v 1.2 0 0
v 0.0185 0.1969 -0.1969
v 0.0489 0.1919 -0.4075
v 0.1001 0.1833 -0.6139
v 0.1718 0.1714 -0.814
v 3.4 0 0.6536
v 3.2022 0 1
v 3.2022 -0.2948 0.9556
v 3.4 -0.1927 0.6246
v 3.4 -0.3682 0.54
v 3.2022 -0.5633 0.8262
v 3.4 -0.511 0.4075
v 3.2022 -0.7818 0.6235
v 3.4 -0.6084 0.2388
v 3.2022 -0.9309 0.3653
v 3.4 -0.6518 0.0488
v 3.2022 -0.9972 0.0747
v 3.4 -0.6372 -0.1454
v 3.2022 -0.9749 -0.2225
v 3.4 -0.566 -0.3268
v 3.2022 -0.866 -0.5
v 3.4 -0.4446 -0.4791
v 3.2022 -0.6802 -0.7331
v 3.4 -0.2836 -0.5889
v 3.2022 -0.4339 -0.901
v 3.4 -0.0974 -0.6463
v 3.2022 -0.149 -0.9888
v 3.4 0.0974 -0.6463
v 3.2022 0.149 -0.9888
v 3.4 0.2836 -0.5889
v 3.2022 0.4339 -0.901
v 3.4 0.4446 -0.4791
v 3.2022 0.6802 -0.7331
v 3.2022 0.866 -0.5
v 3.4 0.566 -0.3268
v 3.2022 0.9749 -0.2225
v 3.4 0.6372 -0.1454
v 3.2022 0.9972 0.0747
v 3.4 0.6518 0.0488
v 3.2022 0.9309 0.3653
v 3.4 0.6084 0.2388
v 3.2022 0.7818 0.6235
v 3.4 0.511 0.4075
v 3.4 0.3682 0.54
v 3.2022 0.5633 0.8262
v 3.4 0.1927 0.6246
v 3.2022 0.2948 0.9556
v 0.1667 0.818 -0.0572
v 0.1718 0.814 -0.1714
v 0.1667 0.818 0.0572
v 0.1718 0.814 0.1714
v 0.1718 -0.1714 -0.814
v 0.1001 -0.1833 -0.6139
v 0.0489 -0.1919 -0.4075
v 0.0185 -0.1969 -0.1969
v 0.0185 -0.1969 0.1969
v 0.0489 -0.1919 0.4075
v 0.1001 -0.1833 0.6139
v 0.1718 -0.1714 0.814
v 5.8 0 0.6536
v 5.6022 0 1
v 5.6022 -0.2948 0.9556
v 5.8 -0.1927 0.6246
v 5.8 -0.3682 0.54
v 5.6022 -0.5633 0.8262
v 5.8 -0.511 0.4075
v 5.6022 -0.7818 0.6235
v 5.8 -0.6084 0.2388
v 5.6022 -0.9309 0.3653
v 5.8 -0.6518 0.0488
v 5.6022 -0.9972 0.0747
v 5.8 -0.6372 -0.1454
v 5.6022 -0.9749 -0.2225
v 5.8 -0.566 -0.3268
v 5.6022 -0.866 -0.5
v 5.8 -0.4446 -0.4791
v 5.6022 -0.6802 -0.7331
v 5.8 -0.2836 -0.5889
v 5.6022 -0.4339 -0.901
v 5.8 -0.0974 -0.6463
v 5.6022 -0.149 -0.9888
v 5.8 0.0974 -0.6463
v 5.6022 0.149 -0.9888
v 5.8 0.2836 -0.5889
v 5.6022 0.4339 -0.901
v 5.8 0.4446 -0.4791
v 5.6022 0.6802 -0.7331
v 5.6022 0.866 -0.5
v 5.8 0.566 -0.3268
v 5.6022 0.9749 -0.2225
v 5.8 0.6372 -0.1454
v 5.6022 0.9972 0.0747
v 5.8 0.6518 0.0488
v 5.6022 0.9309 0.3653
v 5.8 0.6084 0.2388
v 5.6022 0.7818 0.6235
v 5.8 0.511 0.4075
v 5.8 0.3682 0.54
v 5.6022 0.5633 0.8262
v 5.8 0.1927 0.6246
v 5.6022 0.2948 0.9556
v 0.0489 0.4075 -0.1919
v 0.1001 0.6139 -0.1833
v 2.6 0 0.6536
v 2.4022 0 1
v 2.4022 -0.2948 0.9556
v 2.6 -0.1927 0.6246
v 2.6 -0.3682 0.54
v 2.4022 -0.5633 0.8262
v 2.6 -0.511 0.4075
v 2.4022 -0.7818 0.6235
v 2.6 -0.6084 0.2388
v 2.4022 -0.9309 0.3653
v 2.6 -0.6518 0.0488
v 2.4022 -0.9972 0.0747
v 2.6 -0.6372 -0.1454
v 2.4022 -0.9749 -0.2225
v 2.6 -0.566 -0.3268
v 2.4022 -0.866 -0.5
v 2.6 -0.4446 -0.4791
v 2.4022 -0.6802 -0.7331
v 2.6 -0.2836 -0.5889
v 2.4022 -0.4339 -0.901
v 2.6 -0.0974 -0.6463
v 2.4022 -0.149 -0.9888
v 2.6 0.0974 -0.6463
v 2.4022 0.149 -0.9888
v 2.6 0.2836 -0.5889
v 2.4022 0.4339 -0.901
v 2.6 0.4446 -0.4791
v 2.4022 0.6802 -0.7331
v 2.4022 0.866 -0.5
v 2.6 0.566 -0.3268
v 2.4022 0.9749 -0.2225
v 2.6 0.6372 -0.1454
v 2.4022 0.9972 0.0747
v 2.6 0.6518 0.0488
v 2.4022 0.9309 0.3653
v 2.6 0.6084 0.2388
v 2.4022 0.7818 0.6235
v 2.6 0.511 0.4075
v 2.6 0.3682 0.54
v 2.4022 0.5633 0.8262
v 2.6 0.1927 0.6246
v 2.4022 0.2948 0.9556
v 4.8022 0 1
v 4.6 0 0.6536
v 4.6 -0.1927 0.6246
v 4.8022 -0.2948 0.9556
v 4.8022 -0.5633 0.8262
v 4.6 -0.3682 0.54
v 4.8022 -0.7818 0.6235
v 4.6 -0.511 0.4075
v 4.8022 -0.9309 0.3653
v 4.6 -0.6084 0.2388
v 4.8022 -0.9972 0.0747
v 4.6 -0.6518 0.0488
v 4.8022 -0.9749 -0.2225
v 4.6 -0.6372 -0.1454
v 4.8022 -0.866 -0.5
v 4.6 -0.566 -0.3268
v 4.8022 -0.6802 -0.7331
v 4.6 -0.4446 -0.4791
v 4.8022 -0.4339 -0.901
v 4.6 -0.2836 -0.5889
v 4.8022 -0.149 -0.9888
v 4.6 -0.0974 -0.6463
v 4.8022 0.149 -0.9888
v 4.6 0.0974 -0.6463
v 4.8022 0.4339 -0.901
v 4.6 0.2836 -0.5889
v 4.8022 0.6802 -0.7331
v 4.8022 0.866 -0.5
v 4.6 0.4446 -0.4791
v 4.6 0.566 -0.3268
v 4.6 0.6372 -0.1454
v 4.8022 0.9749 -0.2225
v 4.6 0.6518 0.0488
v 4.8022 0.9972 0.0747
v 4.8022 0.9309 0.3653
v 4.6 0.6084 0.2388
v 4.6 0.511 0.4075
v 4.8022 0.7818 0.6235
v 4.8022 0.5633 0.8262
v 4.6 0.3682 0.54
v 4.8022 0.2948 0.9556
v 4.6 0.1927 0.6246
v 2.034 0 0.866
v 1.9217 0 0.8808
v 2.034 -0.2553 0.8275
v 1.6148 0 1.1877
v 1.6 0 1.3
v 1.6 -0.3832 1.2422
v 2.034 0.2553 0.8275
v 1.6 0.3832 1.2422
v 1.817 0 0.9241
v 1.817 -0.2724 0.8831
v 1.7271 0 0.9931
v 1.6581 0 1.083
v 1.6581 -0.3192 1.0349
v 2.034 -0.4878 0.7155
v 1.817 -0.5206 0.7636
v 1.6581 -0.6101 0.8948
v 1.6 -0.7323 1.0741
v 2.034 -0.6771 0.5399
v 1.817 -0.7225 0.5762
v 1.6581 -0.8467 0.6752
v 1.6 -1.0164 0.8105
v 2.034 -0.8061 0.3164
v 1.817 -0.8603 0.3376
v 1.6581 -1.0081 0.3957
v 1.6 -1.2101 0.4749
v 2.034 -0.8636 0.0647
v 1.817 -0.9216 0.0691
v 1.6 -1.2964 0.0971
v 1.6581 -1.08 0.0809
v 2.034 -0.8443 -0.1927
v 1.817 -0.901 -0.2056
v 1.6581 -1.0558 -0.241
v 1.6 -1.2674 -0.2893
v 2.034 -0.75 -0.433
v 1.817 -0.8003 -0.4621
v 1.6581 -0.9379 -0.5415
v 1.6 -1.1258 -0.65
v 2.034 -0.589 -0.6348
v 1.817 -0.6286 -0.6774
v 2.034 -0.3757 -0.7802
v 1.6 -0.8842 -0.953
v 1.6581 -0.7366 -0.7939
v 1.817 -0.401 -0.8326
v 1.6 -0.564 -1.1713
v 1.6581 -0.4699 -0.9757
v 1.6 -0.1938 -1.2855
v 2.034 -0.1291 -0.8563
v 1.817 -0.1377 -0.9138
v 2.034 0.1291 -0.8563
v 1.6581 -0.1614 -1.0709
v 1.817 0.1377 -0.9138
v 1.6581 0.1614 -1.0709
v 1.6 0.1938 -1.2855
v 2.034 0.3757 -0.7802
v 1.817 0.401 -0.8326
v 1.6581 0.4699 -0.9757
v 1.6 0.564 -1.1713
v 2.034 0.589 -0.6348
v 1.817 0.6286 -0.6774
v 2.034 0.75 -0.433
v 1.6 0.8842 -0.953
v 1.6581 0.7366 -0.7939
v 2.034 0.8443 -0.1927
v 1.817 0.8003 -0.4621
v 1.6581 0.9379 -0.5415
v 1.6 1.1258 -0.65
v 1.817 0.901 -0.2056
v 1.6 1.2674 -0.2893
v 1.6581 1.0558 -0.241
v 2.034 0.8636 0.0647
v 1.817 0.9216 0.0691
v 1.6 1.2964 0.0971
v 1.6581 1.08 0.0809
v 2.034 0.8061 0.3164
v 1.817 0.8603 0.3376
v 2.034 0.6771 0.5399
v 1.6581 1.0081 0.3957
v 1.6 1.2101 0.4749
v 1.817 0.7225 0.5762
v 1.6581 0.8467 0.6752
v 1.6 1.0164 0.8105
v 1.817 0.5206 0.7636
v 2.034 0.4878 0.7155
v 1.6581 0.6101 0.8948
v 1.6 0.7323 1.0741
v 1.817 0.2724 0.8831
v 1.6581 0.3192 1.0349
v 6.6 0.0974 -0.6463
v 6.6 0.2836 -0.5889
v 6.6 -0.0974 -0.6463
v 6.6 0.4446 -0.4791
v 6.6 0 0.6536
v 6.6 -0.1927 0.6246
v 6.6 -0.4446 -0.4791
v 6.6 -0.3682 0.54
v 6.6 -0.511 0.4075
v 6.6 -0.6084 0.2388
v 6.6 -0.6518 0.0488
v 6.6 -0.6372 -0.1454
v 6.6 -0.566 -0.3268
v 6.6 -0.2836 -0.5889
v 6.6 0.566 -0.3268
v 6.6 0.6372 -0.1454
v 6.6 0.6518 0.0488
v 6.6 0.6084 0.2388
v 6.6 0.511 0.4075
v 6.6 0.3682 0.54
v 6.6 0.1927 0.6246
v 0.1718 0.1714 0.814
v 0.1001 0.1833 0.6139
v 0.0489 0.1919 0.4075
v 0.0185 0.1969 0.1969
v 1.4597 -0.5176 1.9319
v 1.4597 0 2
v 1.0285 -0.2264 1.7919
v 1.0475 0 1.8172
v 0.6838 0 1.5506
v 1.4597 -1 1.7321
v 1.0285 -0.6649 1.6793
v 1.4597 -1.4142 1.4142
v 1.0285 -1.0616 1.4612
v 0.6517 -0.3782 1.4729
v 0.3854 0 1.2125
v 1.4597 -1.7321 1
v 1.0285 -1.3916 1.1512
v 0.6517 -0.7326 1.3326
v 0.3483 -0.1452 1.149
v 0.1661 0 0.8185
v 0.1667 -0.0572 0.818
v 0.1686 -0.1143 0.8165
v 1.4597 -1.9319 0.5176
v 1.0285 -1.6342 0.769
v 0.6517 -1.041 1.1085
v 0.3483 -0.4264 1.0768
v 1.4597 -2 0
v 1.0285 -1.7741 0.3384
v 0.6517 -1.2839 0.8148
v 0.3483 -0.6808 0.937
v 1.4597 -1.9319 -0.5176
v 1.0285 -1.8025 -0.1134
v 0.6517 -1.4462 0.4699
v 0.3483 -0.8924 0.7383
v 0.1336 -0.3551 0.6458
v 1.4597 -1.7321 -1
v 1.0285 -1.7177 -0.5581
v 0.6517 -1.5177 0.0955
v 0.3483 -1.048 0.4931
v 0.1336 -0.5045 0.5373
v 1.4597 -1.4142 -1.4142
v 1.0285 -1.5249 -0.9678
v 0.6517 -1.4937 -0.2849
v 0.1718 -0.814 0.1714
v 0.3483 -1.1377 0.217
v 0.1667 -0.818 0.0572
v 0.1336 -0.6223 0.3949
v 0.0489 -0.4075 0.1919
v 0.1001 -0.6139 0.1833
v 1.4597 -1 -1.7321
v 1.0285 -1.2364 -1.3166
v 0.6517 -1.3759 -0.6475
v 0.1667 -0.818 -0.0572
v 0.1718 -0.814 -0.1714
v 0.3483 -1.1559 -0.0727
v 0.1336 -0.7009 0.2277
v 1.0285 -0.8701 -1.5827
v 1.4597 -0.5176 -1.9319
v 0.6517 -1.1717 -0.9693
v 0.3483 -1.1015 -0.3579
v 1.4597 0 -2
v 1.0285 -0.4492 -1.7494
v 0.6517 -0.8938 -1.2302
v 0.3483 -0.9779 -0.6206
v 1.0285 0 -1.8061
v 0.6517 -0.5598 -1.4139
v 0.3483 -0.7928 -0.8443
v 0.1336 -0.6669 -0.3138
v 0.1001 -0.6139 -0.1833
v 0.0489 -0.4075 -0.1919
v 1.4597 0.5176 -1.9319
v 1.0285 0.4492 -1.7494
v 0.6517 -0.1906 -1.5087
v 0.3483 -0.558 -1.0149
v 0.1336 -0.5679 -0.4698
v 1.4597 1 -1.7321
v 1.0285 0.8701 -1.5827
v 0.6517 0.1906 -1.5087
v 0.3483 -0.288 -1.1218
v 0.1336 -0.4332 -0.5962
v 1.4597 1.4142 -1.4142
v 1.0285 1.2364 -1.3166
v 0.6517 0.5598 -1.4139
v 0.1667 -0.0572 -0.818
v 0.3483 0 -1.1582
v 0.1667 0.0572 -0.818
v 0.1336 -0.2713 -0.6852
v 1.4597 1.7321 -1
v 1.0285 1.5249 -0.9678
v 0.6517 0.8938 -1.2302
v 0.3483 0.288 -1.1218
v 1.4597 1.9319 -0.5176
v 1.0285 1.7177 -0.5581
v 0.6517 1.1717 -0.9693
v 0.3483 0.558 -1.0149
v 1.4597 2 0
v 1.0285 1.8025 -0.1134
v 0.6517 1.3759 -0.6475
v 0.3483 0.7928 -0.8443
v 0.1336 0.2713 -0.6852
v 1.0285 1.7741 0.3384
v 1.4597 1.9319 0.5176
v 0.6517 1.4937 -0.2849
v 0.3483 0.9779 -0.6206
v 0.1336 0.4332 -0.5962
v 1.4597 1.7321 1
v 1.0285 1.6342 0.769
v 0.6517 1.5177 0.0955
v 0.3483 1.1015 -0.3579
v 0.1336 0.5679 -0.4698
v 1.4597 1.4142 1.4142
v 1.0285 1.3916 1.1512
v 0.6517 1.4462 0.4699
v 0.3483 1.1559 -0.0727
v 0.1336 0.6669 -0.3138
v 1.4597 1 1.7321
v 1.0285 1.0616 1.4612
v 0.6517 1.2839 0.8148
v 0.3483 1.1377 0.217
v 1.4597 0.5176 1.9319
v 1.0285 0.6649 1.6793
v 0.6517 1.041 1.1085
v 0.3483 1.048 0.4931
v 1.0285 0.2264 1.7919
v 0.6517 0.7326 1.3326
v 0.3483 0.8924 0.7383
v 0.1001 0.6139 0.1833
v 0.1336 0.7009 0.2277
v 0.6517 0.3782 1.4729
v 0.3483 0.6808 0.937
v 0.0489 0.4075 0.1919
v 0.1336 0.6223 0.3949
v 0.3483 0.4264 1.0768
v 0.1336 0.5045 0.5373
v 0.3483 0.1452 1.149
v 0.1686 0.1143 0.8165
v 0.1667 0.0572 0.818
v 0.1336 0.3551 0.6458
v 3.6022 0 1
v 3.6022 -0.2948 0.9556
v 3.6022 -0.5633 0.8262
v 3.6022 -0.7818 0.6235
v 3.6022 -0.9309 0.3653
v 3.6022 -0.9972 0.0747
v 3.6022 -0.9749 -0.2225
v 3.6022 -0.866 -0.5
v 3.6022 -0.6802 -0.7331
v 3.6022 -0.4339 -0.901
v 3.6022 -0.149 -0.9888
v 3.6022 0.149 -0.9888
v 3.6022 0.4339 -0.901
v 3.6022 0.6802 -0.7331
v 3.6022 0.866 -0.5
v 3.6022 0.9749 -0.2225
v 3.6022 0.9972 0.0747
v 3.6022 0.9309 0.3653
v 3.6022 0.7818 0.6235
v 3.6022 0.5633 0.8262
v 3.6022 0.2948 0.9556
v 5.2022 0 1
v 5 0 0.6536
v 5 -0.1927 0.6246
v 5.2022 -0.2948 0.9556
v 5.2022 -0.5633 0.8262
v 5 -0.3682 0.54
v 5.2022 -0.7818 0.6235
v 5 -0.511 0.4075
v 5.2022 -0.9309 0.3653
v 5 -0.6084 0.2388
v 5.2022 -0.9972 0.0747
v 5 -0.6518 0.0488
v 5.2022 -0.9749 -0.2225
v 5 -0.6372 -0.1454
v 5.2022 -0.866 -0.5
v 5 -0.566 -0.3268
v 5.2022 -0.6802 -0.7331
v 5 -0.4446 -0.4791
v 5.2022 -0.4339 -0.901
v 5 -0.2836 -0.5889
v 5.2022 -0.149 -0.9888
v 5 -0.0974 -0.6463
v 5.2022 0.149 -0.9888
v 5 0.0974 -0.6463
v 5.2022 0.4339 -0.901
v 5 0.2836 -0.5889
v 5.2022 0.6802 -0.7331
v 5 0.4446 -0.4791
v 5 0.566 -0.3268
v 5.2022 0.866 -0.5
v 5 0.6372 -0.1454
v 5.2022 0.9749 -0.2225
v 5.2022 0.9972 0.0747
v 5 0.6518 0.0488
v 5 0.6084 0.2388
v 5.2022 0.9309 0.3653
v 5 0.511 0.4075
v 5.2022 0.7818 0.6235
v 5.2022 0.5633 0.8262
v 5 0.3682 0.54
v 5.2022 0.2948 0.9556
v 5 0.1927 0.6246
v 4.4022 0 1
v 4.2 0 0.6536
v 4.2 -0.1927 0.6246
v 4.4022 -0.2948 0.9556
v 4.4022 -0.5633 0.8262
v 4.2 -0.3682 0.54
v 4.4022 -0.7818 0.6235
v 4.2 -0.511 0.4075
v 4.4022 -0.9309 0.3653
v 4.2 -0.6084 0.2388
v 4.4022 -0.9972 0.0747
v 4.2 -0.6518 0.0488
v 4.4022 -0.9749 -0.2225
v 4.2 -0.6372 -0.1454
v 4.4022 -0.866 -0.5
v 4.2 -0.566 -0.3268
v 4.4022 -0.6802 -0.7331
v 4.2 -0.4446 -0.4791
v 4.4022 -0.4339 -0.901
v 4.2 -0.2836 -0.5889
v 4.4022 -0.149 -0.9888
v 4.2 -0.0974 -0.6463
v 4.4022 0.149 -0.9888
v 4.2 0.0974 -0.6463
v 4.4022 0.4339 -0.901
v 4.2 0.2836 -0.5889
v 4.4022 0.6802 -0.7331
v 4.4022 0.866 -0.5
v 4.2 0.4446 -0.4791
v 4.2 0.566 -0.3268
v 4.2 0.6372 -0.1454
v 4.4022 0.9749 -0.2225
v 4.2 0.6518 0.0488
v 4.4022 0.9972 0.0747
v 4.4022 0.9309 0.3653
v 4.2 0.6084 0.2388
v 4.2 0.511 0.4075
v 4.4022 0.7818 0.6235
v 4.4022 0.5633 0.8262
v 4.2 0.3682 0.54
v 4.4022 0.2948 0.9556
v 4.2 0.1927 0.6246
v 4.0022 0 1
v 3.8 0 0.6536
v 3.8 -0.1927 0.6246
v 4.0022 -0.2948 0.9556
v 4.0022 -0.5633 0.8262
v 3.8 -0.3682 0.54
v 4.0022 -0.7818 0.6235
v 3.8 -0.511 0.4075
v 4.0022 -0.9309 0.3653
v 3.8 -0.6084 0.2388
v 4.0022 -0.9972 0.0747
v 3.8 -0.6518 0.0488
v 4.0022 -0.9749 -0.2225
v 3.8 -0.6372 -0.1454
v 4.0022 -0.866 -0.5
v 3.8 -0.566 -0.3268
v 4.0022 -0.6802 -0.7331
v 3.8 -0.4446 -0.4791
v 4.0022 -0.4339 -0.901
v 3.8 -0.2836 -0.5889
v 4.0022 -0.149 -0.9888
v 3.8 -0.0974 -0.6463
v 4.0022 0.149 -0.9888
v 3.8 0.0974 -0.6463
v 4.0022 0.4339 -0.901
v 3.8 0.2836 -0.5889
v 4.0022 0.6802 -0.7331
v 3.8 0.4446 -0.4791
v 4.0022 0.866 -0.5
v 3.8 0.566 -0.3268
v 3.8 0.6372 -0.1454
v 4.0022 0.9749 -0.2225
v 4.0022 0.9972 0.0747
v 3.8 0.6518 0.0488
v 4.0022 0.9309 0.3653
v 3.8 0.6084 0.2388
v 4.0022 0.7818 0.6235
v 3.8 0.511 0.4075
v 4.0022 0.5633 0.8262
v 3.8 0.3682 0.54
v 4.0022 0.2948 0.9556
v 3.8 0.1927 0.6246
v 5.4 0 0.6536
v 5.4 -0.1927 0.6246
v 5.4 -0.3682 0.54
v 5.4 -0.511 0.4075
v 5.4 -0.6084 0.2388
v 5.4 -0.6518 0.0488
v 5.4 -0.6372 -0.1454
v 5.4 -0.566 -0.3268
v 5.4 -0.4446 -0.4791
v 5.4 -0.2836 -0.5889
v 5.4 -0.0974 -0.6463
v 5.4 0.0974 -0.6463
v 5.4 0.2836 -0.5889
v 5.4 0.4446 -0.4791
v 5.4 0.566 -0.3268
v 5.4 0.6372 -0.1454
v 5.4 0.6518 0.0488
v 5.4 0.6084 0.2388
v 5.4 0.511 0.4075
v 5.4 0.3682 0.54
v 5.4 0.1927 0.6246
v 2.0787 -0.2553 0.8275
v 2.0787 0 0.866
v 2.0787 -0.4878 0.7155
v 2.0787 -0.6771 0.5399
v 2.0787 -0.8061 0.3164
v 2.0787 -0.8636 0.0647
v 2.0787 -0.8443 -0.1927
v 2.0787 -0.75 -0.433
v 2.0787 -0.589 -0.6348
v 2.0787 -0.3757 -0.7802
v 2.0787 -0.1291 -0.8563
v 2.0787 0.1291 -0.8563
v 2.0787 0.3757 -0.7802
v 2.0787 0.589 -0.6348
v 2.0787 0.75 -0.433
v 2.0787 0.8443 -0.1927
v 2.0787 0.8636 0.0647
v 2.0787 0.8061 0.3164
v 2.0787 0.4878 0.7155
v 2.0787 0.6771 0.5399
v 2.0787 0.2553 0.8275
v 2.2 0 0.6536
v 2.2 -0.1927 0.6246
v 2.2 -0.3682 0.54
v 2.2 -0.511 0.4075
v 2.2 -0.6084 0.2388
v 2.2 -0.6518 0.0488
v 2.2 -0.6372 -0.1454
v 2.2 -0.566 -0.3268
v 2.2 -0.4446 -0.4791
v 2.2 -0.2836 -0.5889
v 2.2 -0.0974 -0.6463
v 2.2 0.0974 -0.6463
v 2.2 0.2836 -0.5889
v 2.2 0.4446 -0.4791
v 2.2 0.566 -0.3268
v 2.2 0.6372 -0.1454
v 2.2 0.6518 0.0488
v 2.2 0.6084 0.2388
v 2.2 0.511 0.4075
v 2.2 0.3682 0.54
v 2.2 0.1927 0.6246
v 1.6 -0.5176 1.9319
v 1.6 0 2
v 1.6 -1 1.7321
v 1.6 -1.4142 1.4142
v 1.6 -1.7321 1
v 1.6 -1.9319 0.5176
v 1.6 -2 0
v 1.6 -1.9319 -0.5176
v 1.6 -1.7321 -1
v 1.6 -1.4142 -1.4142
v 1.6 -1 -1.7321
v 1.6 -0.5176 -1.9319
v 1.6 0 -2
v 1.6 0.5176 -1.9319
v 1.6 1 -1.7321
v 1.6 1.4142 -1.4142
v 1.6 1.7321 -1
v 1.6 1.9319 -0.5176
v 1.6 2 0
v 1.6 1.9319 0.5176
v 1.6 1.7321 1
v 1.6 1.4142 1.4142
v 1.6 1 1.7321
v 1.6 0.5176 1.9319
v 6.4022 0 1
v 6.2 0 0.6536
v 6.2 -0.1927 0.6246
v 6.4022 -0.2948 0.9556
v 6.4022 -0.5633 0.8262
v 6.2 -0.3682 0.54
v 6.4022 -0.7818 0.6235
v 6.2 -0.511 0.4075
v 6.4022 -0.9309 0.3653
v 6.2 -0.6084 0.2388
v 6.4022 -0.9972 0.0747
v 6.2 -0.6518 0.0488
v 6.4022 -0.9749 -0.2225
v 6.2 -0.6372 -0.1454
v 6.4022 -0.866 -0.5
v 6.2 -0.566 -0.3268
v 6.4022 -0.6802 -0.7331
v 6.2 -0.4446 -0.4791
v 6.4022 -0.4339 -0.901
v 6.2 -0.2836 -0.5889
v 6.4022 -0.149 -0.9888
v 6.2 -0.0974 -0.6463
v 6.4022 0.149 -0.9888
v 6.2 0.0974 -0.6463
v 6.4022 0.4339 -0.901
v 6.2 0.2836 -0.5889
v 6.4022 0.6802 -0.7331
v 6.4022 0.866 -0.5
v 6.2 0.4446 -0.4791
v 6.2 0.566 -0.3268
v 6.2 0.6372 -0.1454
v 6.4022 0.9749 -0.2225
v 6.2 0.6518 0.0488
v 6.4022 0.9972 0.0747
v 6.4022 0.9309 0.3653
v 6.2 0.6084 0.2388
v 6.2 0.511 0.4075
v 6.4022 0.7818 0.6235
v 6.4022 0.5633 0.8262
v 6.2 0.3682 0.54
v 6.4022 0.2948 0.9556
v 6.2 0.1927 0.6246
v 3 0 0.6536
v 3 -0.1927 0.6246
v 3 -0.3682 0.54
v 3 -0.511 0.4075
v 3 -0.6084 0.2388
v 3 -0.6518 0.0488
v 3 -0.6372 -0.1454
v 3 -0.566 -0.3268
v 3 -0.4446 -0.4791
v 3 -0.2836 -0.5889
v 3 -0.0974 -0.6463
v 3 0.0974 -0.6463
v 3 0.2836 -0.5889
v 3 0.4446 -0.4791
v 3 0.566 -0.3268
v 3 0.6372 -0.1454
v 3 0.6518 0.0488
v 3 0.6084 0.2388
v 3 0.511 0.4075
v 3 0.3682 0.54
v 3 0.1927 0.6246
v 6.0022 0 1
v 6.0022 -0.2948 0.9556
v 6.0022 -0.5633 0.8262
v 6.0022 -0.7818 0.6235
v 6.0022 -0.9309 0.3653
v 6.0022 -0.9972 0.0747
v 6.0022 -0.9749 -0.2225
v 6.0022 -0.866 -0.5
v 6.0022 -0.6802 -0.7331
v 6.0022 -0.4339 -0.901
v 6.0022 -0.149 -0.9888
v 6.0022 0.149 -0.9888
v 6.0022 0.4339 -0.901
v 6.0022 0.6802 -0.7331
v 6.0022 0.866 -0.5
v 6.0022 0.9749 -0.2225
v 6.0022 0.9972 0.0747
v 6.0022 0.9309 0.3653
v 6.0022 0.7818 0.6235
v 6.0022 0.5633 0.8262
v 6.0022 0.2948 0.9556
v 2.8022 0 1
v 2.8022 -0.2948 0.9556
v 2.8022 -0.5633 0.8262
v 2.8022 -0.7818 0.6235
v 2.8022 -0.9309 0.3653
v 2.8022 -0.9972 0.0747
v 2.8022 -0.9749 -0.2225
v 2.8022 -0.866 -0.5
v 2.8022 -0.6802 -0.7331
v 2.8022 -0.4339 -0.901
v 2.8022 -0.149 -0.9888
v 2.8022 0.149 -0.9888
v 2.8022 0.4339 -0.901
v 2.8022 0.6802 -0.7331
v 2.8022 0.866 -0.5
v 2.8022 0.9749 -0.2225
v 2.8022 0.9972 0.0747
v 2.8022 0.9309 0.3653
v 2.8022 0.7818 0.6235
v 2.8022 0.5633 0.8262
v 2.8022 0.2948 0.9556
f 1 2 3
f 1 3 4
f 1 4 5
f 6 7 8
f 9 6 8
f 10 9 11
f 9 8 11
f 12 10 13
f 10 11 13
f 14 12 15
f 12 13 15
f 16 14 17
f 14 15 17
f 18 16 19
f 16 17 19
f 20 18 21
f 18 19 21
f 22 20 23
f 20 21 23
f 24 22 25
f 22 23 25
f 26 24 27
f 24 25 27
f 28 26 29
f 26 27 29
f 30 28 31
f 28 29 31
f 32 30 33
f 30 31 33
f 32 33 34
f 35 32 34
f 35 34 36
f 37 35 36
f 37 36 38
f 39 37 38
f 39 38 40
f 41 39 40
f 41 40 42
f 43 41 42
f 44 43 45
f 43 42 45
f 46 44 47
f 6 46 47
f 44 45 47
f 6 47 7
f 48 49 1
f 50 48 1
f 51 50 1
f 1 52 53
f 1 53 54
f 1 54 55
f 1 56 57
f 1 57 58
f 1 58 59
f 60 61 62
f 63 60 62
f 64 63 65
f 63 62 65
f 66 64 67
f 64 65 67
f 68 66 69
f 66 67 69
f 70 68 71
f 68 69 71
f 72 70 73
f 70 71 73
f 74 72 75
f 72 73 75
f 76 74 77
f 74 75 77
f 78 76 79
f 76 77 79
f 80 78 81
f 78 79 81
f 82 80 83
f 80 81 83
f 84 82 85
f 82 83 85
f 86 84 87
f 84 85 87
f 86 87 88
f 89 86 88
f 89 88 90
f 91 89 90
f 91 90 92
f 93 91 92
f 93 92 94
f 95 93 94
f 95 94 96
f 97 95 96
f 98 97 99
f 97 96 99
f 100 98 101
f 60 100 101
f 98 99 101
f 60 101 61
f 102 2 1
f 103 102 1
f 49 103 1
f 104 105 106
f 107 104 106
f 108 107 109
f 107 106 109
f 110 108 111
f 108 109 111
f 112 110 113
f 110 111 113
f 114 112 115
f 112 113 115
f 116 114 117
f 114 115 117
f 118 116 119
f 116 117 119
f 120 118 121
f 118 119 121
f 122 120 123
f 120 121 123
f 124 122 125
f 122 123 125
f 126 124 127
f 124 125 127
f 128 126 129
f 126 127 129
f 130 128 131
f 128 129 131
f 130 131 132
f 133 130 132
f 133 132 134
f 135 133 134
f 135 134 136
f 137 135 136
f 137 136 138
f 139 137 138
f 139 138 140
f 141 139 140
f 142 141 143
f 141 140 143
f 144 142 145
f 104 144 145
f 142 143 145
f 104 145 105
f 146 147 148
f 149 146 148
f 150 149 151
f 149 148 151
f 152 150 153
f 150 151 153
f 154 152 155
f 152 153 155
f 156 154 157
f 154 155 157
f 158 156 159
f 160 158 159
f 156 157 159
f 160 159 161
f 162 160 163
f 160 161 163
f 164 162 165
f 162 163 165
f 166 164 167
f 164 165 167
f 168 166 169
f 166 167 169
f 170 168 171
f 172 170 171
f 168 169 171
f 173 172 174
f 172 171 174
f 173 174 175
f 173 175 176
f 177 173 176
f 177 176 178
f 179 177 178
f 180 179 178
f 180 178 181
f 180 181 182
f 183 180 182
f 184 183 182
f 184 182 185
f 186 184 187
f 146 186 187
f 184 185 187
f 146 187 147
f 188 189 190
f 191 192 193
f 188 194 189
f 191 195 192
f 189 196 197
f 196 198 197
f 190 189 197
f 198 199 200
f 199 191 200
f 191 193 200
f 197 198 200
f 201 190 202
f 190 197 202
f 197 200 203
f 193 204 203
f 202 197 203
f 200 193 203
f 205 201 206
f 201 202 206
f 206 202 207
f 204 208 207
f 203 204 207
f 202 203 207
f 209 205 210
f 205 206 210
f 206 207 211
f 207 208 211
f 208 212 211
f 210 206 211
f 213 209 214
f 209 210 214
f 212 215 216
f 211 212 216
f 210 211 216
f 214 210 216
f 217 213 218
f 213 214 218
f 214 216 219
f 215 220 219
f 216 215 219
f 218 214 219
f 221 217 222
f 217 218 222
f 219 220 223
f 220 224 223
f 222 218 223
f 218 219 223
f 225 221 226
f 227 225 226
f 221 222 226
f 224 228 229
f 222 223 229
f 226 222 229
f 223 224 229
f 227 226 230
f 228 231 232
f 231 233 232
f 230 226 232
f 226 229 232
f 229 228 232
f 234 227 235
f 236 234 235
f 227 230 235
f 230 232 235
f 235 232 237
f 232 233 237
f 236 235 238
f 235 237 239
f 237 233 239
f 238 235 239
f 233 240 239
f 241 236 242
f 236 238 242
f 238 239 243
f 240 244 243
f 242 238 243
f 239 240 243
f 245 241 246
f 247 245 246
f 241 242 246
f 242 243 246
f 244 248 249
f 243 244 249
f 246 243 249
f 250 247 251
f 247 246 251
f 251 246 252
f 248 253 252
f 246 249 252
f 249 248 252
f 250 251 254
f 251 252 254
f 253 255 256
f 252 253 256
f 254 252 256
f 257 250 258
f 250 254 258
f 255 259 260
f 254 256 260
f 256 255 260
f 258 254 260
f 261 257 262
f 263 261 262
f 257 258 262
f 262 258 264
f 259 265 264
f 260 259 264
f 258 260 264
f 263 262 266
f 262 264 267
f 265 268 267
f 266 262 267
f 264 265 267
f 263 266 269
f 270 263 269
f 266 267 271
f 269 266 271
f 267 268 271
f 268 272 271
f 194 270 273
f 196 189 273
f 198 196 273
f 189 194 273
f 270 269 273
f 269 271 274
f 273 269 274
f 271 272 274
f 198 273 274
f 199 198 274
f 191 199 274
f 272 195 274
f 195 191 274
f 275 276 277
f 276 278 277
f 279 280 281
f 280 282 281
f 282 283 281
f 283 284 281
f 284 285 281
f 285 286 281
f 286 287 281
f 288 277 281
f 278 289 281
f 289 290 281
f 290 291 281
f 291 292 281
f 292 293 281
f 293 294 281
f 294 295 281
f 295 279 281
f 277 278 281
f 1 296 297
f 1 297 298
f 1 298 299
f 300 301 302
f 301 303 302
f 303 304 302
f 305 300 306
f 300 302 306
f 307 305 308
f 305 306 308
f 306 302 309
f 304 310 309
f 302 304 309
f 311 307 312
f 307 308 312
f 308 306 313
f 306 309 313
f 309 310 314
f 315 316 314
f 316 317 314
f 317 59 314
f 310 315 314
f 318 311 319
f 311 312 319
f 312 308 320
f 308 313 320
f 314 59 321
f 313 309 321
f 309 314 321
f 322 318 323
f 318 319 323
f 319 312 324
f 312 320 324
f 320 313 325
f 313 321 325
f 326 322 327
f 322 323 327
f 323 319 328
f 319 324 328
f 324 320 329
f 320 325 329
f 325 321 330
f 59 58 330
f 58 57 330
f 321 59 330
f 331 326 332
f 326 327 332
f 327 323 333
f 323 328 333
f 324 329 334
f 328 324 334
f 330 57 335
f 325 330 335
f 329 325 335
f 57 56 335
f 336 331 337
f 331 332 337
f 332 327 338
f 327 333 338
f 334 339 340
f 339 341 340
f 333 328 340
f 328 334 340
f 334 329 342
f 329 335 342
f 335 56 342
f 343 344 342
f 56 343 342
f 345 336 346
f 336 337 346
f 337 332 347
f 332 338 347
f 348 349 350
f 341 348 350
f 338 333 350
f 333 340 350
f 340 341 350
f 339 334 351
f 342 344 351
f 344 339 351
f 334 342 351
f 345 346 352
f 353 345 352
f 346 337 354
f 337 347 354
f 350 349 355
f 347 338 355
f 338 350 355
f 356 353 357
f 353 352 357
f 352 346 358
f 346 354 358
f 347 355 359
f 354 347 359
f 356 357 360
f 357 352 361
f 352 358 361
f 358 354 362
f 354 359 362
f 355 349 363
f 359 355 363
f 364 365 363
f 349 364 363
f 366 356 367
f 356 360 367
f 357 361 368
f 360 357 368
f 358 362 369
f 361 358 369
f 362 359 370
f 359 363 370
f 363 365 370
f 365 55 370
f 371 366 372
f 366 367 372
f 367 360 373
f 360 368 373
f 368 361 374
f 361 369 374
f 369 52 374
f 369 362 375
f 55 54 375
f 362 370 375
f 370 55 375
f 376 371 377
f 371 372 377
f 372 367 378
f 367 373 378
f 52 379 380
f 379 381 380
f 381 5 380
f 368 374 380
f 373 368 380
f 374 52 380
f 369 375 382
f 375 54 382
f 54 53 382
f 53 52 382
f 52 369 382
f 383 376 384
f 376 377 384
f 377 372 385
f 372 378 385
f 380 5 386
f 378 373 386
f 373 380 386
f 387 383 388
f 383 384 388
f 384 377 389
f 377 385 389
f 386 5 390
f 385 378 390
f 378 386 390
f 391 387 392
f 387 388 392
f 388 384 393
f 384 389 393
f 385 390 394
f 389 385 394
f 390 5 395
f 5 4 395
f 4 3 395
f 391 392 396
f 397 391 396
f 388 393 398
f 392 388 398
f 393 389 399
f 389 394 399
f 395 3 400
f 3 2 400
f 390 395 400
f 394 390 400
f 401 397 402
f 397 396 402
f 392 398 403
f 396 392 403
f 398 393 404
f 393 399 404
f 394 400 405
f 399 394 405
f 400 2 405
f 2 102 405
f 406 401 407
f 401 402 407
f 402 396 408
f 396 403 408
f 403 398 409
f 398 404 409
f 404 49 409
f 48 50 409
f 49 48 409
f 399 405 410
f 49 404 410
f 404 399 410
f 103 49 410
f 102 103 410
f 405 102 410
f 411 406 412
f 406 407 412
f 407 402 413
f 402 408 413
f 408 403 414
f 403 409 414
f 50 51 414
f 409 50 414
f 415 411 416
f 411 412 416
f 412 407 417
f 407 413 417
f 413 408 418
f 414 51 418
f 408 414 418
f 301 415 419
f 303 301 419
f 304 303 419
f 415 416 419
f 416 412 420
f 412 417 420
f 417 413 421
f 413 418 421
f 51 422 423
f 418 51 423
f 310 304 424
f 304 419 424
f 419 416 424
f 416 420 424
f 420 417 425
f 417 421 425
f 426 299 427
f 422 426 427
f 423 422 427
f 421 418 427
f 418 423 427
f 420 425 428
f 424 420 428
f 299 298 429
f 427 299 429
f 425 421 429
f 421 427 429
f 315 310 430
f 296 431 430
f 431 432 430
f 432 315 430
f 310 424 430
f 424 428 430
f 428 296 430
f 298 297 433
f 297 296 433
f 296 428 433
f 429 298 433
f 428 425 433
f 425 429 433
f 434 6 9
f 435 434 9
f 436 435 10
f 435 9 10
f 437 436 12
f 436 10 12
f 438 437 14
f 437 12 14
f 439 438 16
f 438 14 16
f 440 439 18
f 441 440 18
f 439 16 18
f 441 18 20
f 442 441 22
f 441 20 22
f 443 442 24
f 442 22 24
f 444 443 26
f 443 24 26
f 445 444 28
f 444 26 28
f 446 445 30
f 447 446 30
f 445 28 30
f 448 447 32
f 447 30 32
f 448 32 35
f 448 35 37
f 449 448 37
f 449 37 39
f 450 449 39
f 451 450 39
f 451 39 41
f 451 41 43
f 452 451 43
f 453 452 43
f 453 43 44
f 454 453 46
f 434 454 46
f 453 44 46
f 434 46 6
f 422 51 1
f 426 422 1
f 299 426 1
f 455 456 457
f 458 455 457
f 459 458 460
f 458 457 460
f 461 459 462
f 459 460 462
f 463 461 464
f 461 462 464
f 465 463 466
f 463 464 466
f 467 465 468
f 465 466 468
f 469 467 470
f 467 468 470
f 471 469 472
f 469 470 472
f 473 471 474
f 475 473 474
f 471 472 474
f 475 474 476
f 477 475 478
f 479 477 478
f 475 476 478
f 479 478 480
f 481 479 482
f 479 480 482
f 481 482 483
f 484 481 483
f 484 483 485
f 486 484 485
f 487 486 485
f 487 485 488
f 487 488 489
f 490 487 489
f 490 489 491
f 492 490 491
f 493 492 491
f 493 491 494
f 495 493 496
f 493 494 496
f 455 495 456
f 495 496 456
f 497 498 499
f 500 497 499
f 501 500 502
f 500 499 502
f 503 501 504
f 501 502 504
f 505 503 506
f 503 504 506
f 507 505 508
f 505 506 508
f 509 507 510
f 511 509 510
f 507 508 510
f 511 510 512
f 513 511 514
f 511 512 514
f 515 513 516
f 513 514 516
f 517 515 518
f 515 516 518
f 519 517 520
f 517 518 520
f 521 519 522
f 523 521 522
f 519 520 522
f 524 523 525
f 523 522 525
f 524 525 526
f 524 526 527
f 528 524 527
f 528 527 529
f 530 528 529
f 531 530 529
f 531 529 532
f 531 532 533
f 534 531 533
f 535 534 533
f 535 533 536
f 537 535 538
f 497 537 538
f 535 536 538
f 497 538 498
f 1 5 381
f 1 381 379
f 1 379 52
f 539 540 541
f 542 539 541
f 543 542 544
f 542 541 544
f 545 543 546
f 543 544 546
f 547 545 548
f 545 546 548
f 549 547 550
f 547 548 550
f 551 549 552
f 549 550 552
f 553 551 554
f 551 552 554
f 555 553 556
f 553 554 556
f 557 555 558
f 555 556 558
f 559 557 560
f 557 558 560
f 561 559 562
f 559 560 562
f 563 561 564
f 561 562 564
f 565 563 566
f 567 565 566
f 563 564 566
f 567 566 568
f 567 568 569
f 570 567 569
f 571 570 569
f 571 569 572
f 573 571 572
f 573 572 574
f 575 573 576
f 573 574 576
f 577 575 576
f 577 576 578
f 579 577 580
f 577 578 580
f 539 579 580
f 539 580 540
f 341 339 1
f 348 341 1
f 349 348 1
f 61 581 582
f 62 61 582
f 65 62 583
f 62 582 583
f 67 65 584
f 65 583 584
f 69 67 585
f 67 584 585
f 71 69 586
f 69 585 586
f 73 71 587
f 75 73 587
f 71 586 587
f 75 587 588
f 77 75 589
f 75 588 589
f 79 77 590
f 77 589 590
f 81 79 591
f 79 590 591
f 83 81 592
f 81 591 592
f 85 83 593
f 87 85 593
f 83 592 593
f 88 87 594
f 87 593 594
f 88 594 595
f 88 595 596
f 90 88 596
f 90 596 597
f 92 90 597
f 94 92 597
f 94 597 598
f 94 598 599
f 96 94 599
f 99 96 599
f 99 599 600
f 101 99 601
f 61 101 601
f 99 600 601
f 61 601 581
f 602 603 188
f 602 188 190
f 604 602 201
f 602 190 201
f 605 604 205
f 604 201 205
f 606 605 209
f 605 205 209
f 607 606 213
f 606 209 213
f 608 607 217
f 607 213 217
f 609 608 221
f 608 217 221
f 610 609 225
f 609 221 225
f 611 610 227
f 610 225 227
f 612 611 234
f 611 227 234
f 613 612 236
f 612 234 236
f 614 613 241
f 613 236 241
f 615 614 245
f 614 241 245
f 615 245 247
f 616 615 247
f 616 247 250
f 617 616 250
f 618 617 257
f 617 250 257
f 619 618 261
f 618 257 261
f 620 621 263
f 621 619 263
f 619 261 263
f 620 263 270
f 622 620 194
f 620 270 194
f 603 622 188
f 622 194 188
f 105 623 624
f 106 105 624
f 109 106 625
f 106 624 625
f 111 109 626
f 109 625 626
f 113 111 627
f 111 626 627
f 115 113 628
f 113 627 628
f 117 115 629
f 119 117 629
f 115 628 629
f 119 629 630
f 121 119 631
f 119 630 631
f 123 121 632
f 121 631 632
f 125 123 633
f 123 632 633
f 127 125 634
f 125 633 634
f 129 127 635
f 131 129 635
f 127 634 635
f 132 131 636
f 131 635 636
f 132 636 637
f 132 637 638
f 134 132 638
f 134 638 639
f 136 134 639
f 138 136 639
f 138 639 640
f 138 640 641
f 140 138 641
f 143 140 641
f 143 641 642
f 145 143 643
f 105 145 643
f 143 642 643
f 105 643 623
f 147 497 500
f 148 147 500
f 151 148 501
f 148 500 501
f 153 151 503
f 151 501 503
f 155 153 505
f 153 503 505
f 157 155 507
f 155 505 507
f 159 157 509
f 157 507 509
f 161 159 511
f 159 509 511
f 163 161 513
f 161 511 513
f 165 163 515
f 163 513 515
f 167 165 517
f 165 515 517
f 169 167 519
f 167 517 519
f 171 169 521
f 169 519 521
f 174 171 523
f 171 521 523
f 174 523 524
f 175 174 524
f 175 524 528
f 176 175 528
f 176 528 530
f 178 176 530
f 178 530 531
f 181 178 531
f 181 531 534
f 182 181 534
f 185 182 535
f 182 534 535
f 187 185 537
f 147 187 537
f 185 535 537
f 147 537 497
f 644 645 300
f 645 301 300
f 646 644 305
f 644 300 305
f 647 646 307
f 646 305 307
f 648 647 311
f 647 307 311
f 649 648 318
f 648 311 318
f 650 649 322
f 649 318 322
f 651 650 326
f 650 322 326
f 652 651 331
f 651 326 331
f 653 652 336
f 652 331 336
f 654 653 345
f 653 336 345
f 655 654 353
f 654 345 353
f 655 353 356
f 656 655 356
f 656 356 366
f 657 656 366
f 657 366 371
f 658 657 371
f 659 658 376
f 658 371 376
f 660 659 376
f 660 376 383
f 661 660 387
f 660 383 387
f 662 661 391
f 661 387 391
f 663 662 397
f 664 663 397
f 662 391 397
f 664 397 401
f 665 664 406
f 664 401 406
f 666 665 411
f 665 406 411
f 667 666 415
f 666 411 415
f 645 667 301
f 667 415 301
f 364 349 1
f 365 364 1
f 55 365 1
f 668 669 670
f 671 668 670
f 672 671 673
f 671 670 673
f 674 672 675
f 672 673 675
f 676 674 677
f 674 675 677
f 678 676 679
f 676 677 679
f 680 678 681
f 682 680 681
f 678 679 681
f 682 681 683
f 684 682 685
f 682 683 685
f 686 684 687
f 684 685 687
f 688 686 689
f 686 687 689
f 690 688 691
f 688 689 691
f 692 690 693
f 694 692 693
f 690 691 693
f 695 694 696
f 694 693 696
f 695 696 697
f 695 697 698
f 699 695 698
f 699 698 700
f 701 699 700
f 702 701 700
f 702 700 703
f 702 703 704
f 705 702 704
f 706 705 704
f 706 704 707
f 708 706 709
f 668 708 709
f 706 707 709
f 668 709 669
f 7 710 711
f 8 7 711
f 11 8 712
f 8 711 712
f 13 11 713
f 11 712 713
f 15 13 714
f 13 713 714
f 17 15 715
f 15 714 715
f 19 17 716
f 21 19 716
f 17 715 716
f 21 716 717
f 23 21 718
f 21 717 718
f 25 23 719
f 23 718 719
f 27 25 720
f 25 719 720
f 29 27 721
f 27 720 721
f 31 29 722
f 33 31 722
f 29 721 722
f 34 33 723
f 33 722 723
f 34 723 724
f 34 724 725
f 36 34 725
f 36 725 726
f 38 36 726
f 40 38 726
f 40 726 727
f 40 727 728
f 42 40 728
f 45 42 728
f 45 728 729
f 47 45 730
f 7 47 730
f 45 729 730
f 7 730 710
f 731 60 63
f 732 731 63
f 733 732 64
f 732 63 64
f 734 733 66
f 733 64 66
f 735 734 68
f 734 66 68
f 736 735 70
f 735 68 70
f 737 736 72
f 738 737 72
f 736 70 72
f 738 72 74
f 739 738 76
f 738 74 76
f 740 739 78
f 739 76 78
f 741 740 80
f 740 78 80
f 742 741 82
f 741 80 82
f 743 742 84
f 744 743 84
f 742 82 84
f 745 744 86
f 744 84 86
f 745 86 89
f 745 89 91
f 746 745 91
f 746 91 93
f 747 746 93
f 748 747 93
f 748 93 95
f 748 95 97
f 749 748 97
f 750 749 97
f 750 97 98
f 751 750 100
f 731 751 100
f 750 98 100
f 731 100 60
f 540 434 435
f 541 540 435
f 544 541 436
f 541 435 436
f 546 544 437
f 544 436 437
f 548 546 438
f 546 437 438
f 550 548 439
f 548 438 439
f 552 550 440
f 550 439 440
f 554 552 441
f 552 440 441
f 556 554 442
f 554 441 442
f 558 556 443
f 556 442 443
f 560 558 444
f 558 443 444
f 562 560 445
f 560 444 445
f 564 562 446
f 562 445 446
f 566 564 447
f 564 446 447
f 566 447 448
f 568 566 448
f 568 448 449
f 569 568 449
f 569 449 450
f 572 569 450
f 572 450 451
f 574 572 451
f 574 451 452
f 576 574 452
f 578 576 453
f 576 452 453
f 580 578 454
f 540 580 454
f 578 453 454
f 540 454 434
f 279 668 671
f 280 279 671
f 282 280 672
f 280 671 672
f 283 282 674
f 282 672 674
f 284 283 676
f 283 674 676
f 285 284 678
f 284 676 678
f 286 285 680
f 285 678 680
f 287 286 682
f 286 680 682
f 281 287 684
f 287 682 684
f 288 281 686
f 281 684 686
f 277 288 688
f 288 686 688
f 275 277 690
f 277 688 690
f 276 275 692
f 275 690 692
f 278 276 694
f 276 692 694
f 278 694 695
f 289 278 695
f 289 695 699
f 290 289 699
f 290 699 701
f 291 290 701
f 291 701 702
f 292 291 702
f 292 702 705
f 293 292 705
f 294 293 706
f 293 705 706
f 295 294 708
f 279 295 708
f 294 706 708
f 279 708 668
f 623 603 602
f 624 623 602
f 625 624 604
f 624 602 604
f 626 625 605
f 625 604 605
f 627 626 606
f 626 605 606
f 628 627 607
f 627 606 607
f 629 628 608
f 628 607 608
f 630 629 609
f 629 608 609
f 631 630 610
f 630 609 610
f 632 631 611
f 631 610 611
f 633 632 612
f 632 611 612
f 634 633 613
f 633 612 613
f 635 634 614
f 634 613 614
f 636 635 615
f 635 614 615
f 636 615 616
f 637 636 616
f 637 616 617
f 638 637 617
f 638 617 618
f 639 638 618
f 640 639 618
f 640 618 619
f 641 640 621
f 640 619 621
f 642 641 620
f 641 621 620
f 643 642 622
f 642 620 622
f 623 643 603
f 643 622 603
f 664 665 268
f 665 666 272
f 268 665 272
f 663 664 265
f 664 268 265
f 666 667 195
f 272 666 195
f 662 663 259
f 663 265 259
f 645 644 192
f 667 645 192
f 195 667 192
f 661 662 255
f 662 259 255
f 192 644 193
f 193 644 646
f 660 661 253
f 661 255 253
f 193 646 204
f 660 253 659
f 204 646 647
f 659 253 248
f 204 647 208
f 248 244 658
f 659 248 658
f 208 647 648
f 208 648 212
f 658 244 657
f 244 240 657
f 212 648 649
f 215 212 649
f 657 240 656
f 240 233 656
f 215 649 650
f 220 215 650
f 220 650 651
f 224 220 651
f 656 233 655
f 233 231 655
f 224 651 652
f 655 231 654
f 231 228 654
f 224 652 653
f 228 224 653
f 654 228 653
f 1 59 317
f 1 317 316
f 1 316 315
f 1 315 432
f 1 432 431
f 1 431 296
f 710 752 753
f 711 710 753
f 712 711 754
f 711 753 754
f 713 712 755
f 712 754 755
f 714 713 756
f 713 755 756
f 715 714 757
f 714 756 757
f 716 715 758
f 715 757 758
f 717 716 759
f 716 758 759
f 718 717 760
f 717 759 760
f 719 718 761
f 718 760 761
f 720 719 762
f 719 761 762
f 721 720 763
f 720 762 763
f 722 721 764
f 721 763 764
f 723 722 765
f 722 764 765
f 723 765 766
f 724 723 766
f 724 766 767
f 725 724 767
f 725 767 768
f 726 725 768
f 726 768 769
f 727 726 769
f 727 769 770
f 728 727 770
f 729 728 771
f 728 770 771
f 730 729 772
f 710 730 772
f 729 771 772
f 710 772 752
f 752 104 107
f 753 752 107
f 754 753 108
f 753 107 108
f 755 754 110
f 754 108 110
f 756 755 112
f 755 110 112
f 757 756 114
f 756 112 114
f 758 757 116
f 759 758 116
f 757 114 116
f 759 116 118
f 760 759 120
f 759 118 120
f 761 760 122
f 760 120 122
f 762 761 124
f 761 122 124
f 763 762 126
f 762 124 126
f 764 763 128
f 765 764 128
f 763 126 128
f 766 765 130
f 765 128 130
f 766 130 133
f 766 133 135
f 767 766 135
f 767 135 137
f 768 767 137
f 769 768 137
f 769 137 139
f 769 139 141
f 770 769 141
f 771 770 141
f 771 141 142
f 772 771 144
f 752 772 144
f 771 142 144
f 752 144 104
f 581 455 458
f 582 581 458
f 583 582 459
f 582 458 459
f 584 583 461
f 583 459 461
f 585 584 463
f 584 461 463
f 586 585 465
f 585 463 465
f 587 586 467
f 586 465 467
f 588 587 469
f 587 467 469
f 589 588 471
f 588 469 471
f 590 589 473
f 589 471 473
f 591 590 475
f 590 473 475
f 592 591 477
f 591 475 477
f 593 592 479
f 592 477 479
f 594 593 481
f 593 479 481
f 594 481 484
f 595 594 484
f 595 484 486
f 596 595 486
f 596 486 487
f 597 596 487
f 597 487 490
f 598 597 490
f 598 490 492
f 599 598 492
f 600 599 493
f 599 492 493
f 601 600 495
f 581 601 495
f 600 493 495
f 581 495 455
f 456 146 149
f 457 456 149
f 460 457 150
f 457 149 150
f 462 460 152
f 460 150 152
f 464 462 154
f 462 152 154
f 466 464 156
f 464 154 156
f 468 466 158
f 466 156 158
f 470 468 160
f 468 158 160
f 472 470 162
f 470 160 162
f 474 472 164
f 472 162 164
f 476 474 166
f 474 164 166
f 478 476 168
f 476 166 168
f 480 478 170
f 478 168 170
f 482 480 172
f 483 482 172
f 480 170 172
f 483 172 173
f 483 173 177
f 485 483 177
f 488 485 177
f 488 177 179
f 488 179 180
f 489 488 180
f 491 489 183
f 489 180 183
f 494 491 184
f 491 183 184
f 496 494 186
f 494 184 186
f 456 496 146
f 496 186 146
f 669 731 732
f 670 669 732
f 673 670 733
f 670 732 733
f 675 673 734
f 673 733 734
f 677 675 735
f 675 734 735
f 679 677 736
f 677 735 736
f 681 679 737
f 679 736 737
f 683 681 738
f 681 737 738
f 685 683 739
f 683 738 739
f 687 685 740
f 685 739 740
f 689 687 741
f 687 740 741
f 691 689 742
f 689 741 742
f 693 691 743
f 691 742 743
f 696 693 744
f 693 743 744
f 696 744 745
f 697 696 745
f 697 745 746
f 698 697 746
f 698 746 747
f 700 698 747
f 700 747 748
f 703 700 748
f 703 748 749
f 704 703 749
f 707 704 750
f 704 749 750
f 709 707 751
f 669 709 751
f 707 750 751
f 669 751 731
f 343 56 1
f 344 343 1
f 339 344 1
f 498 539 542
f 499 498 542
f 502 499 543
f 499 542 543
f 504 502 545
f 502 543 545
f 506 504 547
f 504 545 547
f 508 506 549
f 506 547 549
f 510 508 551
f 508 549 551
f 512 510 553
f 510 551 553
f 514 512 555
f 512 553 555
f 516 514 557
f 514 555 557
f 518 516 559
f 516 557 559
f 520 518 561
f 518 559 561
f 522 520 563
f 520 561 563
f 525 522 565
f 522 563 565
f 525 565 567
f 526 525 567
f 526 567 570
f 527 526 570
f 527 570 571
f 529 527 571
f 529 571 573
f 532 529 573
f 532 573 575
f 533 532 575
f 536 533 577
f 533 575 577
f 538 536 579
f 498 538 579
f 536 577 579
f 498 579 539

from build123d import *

# Parameters (mm, degrees)
PATTERN_LINEAR_1_COUNT = 12
PATTERN_LINEAR_1_PITCH = 0.4


with BuildPart() as part:
    # 草图2 → Revolve 808 (revolve)
    with BuildSketch(Plane.XY, mode=Mode.PRIVATE) as revolve_808_sk:
        with BuildLine():
            Line((0, 0), (6.6, 0))
            Line((6.6, 0), (6.6, 1))
            Line((6.6, 1), (2.4, 1))
            Line((2.4, 1), (2.266, 0.866))
            Line((2.266, 0.866), (2.034, 0.866))
            ThreePointArc((2.034, 0.866), (1.727115657, 0.993115657), (1.6, 1.3))
            Line((1.6, 1.3), (1.6, 2))
            Line((1.6, 2), (1.459687576, 2))
            ThreePointArc((1.459687576, 2), (0.40373114, 1.23801129), (0, 0))
        make_face()
    revolve(revolve_808_sk.sketch.rotate(Axis((-1.331757704, 0, 0), (1, 0, 0)), 90), axis=Axis((-1.331757704, 0, 0), (1, 0, 0)))

    # 草图3 → 切除-旋转1 (revolve, cut)
    with BuildSketch(Plane.XY, mode=Mode.PRIVATE) as cut_revolve_1_sk:
        Polygon((6.402166402, 1), (6.802166402, 1), (6.6, 0.6536), align=None)
    cut_revolve_1 = revolve(cut_revolve_1_sk.sketch.rotate(Axis((-0.242766179, 0, 0), (1, 0, 0)), 90), axis=Axis((-0.242766179, 0, 0), (1, 0, 0)), mode=Mode.SUBTRACT)

    # 阵列(线性)1: 切除-旋转1 ×12
    with Locations(*[(-i * PATTERN_LINEAR_1_PITCH, 0, 0) for i in range(1, PATTERN_LINEAR_1_COUNT)]):
        add(cut_revolve_1, mode=Mode.SUBTRACT)

    # 草图5 → 切除-放样1 section 0
    with BuildSketch(Plane(origin=(0, 0, 0), x_dir=(0, 0, -1), z_dir=(1, 0, 0)), mode=Mode.PRIVATE) as loft_1_s0:
        with BuildLine():
            Line((0.2, 0.95), (-0.2, 0.95))
            Line((-0.2, 0.95), (-0.2, -0.95))
            Line((-0.2, -0.95), (0.2, -0.95))
            Line((0.2, -0.95), (0.2, 0.95))
        make_face()
    loft_1 = loft([Vertex(1.2, 0, 0), loft_1_s0.sketch], mode=Mode.SUBTRACT)

    # 镜向1: 切除-放样1 across plane
    add(loft_1.mirror(Plane(origin=(0, 0, 0), x_dir=(0, 0.7071067811865462, 0.7071067811865488), z_dir=(0, -0.7071067811865488, 0.7071067811865462))), mode=Mode.SUBTRACT)


solid = part.part
